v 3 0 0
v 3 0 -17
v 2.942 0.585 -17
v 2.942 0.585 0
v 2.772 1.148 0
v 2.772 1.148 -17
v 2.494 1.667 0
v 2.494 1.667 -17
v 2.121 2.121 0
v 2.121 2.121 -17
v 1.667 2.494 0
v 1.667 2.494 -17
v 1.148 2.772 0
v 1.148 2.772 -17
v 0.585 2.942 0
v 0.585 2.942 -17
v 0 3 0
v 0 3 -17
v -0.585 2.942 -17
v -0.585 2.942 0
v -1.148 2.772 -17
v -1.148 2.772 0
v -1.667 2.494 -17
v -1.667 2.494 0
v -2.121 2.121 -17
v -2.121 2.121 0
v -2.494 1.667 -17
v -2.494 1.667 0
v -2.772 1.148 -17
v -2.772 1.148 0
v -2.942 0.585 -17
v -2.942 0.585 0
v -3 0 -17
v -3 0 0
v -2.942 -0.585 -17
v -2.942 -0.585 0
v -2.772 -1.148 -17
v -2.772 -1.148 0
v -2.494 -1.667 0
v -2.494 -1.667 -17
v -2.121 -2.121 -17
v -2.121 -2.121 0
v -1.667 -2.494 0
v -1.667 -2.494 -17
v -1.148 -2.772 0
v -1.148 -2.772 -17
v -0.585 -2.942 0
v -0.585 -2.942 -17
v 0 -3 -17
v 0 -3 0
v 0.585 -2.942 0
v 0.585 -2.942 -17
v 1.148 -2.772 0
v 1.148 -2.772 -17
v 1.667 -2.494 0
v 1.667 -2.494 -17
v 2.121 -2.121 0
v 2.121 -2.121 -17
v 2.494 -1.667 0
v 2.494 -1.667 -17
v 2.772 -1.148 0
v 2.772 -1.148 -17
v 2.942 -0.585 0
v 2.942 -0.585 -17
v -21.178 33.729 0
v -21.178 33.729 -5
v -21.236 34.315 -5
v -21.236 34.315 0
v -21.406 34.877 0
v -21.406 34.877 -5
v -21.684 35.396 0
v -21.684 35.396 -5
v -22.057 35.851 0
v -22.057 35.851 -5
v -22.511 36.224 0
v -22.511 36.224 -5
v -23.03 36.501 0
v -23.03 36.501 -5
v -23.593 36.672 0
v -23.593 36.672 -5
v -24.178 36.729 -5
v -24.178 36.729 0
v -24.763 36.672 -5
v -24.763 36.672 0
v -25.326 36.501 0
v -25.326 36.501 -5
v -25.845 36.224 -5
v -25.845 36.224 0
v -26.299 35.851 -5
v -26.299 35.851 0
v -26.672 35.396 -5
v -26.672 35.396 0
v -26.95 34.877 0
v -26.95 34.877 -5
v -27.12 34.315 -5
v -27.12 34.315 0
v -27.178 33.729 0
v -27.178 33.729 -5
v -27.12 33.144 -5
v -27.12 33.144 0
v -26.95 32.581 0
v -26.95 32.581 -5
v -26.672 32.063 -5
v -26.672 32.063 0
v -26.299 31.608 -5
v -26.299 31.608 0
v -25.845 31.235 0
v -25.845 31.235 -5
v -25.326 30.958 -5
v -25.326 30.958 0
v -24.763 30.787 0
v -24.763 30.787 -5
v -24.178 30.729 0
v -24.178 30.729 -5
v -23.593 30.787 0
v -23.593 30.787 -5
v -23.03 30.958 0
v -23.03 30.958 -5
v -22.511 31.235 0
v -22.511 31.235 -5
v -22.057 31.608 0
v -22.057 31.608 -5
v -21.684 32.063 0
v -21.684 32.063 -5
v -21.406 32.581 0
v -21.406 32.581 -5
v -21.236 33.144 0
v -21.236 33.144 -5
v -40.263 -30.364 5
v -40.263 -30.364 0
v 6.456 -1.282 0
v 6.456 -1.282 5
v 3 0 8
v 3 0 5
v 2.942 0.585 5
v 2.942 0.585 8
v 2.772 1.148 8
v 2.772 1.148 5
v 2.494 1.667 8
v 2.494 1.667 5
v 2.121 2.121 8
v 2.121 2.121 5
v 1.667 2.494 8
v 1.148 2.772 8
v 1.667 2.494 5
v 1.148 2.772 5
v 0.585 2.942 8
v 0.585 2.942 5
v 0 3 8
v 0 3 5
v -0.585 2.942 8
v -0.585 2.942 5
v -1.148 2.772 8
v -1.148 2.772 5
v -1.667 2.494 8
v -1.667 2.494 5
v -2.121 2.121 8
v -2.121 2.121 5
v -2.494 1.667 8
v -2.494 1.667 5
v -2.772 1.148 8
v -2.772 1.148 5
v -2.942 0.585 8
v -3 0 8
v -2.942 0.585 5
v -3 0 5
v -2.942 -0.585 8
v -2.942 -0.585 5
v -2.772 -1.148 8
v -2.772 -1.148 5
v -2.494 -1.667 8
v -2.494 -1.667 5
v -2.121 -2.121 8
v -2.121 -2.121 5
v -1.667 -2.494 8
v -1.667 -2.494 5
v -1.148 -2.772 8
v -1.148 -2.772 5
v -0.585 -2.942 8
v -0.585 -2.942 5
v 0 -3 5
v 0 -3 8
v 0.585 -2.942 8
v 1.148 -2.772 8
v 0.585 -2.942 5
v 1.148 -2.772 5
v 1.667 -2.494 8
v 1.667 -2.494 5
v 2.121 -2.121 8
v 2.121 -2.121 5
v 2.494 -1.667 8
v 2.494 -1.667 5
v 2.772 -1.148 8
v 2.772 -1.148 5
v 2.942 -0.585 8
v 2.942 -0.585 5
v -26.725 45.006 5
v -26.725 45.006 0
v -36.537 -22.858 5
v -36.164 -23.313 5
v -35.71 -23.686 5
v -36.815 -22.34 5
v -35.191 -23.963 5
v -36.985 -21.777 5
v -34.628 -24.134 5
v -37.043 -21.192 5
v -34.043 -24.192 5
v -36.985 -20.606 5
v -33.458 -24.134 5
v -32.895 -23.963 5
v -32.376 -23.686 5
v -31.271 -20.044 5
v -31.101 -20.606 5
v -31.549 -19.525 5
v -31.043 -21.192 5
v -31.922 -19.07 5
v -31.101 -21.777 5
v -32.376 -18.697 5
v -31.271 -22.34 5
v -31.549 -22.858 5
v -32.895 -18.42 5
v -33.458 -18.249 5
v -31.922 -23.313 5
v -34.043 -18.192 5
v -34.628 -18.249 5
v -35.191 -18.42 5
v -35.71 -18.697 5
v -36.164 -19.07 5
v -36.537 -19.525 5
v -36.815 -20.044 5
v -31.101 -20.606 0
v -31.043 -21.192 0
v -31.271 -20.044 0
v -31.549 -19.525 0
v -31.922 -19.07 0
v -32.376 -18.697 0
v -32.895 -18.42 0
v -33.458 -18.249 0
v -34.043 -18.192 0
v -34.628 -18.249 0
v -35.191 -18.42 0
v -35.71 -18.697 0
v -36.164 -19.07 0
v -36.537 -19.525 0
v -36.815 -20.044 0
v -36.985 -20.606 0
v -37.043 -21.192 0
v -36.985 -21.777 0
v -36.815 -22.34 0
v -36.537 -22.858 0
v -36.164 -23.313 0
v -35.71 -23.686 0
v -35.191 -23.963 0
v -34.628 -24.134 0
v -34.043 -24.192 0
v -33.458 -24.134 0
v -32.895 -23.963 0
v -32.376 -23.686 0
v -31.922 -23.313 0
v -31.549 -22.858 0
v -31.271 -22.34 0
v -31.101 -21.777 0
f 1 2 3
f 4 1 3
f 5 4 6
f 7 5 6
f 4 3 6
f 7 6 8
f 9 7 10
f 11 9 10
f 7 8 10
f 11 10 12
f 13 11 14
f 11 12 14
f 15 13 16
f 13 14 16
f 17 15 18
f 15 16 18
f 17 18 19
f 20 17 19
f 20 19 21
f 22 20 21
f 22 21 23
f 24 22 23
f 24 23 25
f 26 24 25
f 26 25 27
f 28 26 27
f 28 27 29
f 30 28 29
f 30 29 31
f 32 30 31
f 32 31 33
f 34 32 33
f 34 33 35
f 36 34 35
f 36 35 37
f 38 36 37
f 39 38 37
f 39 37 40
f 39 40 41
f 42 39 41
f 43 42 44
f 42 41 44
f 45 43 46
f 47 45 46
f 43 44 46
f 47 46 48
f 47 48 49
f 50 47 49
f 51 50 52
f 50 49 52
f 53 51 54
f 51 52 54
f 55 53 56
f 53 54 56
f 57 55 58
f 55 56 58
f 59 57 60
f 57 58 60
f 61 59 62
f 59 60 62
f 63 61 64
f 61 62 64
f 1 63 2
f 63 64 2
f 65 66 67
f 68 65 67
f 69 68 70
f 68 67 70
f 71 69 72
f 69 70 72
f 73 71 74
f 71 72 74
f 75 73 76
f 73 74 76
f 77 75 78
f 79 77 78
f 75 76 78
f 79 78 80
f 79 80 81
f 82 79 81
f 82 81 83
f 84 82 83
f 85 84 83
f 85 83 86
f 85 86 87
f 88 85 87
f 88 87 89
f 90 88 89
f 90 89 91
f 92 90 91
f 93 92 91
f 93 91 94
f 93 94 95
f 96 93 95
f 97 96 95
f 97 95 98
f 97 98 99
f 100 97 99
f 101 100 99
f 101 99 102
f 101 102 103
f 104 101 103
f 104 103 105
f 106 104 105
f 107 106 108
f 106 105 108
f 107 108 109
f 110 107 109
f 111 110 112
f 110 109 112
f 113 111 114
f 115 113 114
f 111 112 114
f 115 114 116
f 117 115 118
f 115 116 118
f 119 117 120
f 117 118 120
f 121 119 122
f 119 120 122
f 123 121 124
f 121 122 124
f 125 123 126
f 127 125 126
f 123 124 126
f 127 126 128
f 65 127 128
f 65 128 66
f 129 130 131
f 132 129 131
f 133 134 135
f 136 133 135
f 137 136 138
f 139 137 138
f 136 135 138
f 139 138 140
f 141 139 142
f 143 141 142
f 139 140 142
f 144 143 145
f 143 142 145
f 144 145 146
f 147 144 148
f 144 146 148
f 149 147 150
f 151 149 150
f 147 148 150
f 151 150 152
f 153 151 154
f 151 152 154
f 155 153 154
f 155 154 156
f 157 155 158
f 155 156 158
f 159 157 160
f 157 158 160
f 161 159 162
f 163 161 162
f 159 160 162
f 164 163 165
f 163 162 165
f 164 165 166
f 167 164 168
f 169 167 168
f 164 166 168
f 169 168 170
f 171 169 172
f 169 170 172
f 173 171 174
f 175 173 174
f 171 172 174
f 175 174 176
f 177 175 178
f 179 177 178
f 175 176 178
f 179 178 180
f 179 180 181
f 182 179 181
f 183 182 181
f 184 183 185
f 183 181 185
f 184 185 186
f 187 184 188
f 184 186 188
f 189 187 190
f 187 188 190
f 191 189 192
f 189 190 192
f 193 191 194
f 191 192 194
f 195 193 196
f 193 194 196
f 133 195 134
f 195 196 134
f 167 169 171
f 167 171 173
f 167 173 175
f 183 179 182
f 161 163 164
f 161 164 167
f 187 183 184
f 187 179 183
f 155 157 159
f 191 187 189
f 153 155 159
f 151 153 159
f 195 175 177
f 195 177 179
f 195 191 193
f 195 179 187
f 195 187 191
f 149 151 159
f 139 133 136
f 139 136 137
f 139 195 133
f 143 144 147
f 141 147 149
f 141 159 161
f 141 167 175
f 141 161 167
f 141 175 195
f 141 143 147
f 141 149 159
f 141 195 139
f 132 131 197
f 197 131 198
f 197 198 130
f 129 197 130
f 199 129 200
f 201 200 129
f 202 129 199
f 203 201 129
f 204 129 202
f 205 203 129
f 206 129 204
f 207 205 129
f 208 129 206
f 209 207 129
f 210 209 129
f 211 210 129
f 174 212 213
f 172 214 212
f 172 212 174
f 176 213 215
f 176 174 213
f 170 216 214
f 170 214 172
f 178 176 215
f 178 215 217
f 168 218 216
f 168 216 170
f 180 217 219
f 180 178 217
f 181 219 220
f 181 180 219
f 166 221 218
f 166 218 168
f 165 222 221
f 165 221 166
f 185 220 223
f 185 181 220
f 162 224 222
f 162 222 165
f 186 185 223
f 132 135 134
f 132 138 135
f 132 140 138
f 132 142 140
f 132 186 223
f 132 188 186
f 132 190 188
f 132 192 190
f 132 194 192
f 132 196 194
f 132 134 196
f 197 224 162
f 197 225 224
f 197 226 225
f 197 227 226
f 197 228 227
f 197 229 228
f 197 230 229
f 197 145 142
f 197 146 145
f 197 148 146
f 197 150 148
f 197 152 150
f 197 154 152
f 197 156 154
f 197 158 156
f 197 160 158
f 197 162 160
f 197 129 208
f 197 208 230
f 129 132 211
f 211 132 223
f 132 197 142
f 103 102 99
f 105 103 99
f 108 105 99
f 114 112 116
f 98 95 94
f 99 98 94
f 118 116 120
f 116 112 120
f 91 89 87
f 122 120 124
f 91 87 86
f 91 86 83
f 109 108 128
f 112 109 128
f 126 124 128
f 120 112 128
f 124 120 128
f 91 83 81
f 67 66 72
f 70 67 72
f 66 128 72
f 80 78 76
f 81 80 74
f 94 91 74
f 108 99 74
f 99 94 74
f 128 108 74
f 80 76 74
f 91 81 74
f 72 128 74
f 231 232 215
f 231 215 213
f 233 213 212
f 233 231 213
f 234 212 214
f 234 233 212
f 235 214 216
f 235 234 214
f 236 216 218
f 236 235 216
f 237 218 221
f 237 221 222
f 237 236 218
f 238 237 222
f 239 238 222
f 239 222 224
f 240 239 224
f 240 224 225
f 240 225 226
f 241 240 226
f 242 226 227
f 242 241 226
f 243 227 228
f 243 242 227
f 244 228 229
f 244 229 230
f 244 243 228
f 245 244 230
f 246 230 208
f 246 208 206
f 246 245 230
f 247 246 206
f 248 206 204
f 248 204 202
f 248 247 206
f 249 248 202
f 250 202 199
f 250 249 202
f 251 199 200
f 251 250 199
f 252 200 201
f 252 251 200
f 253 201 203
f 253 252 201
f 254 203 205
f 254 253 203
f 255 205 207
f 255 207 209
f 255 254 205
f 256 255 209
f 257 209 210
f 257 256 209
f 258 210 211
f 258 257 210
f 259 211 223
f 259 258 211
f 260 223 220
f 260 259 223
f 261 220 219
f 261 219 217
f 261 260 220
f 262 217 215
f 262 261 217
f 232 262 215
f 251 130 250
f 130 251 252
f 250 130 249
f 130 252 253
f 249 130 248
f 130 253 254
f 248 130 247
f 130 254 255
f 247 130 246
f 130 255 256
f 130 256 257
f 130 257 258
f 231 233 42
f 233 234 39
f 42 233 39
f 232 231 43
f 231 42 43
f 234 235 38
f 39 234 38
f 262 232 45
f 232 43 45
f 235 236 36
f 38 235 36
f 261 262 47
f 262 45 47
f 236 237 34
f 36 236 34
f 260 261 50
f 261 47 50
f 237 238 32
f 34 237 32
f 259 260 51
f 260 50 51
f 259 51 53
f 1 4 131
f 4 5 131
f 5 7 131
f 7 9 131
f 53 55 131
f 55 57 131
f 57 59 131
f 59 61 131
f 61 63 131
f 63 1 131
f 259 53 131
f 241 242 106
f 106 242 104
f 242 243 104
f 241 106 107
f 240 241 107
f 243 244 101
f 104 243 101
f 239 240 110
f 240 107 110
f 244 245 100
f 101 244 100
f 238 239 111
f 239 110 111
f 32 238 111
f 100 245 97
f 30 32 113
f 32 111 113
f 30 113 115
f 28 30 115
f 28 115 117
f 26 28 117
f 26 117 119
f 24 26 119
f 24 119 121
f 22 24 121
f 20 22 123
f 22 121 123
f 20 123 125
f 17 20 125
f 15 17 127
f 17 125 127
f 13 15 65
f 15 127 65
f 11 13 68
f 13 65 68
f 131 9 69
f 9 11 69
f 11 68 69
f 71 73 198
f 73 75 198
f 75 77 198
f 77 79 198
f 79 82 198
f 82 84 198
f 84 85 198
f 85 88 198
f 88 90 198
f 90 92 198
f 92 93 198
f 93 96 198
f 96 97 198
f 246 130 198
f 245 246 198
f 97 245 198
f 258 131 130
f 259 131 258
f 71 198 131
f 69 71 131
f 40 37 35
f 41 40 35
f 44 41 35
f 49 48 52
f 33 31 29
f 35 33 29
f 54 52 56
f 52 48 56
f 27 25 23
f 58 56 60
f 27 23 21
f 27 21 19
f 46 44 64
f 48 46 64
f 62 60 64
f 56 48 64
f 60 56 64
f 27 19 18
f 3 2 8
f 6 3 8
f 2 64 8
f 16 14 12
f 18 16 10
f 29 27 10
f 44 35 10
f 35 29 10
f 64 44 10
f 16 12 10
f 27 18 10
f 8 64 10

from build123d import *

# Parameters (mm, degrees)
SKETCH1_R           = 3
BOSS_EXTRUDE1_DEPTH = 5
BOSS_EXTRUDE2_START = -10
SKETCH2_R           = 3
BOSS_EXTRUDE2_DEPTH = 10
BOSS_EXTRUDE3_START = -22
SKETCH3_R           = 3
BOSS_EXTRUDE3_DEPTH = 22
SKETCH4_R           = 3
BOSS_EXTRUDE4_DEPTH = 3


with BuildPart() as part:
    # Sketch1 → Boss-Extrude1 (new body)
    with BuildSketch(Plane.XY):
        Polygon((-26.724502293, 45.005919314), (-40.262558922, -30.363907626), (6.455683288, -1.282016359), align=None)
        with Locations((-24.177985347, 33.729438545)):
            Circle(SKETCH1_R, mode=Mode.SUBTRACT)
        Circle(SKETCH1_R, mode=Mode.SUBTRACT)
        with Locations((-34.042997525, -21.191609649)):
            Circle(SKETCH1_R, mode=Mode.SUBTRACT)
    extrude(amount=BOSS_EXTRUDE1_DEPTH)

    # Sketch2 → Boss-Extrude2 (add)
    with BuildSketch(Plane.XY.offset(5).offset(BOSS_EXTRUDE2_START)):
        with Locations((-24.177985347, 33.729438545)):
            Circle(SKETCH2_R)
    extrude(amount=BOSS_EXTRUDE2_DEPTH)

    # Sketch3 → Boss-Extrude3 (add)
    with BuildSketch(Plane.XY.offset(5).offset(BOSS_EXTRUDE3_START)):
        Circle(SKETCH3_R)
    extrude(amount=BOSS_EXTRUDE3_DEPTH)

    # Sketch4 → Boss-Extrude4 (add)
    with BuildSketch(Plane.XY.offset(5)):
        Circle(SKETCH4_R)
    extrude(amount=BOSS_EXTRUDE4_DEPTH)


solid = part.part
